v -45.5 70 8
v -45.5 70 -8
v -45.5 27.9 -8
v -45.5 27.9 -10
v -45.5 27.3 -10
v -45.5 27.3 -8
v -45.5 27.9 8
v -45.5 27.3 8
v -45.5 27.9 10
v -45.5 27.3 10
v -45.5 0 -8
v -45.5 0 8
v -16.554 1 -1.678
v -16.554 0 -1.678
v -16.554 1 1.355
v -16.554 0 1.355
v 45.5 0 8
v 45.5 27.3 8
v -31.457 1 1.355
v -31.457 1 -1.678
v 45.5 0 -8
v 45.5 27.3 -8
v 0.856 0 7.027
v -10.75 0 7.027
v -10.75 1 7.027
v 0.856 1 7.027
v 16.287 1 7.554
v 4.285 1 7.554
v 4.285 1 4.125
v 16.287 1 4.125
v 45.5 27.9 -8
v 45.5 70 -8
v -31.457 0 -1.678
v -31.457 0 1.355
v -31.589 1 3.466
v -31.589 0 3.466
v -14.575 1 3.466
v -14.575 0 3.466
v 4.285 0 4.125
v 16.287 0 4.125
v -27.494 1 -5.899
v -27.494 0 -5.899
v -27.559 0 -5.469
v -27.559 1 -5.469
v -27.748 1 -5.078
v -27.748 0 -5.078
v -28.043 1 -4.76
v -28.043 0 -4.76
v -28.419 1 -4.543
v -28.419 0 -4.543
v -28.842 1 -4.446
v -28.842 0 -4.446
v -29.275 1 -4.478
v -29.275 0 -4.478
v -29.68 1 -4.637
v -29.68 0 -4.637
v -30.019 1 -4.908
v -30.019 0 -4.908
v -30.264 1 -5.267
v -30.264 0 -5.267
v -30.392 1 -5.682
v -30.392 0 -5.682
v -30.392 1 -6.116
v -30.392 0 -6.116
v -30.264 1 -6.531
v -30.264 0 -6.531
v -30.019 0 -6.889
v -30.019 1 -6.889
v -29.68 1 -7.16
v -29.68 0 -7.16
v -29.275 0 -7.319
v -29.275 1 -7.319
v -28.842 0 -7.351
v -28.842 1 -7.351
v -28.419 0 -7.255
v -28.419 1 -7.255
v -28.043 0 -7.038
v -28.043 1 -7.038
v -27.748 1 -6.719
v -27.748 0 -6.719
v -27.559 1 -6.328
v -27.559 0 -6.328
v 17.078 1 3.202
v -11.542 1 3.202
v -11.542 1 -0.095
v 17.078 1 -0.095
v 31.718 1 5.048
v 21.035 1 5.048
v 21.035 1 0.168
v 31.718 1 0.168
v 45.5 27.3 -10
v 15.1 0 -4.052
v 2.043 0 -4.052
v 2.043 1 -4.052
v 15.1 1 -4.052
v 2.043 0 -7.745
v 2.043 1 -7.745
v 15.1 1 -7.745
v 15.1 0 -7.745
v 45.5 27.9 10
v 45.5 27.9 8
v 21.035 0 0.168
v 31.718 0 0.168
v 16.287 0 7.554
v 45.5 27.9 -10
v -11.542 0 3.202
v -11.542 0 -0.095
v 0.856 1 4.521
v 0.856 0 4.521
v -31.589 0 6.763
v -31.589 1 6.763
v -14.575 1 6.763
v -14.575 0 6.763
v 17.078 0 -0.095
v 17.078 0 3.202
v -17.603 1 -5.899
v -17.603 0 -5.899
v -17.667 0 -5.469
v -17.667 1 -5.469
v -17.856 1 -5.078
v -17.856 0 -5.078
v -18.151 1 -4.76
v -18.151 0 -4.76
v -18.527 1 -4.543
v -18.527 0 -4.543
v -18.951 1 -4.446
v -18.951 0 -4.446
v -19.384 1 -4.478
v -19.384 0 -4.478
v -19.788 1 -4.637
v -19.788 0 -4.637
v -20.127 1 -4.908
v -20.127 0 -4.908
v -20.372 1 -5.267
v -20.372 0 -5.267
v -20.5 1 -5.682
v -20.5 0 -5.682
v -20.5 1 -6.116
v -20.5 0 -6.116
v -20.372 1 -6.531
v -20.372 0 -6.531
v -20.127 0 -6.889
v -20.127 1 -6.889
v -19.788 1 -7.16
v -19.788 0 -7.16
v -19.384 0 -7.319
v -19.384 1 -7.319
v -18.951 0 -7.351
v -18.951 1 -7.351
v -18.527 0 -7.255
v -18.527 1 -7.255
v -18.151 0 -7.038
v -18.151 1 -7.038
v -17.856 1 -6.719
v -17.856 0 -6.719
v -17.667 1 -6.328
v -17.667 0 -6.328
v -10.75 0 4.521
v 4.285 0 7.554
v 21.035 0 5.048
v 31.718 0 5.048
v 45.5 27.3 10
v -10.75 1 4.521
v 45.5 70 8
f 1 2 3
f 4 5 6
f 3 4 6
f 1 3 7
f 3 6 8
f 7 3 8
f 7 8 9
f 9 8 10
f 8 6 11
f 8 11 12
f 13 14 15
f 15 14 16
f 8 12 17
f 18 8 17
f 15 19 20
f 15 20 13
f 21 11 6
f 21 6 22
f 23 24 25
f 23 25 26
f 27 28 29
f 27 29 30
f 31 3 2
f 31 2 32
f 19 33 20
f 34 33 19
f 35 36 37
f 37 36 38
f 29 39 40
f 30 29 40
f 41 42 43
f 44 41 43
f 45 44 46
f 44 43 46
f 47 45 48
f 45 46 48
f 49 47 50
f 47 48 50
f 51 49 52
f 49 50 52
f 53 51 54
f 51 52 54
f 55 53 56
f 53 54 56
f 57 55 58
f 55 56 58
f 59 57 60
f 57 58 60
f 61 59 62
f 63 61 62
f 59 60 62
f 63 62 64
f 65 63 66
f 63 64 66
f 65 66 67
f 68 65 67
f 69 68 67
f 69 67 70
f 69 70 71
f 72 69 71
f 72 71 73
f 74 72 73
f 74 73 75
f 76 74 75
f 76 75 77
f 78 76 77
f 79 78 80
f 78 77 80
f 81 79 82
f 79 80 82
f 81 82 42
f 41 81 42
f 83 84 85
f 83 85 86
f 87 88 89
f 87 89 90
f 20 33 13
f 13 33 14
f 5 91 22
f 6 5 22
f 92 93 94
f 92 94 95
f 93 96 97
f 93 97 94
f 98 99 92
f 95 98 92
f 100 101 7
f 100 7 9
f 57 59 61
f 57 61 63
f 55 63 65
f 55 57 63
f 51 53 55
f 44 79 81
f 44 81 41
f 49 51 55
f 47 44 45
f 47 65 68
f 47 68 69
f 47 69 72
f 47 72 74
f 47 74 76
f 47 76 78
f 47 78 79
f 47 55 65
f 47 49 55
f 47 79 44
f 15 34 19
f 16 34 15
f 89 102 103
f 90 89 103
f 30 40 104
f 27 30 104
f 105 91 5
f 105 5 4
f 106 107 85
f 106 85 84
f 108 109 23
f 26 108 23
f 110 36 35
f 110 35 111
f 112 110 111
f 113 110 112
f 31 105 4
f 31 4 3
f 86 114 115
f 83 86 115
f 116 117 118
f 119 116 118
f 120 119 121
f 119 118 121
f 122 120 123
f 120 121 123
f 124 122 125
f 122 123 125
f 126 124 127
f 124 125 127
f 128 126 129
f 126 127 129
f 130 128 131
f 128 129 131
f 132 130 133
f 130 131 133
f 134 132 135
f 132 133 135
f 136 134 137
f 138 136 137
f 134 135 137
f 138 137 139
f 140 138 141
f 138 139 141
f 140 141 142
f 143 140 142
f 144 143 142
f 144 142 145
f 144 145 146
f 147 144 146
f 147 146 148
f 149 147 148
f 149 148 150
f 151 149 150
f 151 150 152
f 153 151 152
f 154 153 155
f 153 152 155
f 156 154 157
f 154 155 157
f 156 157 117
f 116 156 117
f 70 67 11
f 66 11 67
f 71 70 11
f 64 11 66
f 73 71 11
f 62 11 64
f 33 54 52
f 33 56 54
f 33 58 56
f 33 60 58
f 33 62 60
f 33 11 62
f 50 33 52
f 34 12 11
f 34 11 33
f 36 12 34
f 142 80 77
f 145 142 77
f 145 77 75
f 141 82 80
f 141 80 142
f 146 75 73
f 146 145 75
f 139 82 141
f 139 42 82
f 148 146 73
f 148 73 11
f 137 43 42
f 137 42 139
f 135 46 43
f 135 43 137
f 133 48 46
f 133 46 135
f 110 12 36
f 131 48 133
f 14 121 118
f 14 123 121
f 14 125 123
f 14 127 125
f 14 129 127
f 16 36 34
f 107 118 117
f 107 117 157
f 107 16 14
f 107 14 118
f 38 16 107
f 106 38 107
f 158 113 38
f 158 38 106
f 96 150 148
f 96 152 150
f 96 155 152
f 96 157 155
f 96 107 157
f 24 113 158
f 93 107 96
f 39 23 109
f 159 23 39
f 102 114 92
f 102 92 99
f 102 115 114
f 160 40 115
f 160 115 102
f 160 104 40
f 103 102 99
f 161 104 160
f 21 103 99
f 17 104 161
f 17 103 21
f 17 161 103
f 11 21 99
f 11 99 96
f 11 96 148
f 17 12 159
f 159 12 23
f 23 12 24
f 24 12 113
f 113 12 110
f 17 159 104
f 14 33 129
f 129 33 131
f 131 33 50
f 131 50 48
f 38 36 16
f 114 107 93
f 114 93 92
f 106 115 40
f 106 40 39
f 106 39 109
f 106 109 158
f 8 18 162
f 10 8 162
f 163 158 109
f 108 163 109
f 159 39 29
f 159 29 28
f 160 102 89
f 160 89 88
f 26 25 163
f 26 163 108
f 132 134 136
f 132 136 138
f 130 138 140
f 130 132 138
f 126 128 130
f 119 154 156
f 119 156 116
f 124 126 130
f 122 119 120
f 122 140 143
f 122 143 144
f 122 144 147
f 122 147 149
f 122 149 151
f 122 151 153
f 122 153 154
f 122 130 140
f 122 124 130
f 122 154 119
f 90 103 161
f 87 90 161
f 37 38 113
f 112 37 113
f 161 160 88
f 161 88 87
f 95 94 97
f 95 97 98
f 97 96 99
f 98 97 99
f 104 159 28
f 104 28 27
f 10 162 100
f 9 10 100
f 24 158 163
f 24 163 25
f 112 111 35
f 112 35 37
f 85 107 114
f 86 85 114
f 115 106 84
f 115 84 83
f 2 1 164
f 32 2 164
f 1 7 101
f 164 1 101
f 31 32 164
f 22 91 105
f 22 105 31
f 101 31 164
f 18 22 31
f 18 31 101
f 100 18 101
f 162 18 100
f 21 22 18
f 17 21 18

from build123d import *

# Parameters (mm, degrees)
F0_W     = 91
F0_H     = 16
F1_DEPTH = 70
F2_R     = 1.456775
F2_W     = 10.683106
F2_H     = 4.879937
F2_W_2   = 13.057131
F2_H_2   = 3.692926
F2_W_3   = 17.013836
F2_H_3   = 3.297256
F2_W_4   = 14.903594
F2_H_4   = 3.033476
F2_W_5   = 11.60634
F2_H_5   = 2.505915
F2_W_6   = 12.00201
F2_H_6   = 3.429146
F2_W_7   = 28.620178
F2_H_7   = 3.297255
F3_DEPTH = 1
F4_W     = 0.6
F4_H     = 2
F5_DEPTH = 91


with BuildPart() as f1:
    # F0 (on Front) → F1 (new body)
    with BuildSketch(Plane.XZ):
        Rectangle(F0_W, F0_H)
    extrude(amount=-F1_DEPTH)

    # F2 (on face) → F3 (cut)
    with BuildSketch(Plane.XZ):
        with Locations((-28.951265, -5.898637)):
            Circle(F2_R)
        with Locations((-19.059498, -5.898637)):
            Circle(F2_R)
        with Locations((26.376682, 2.608282)):
            Rectangle(F2_W, F2_H)
        with Locations((8.571502, -5.898637)):
            Rectangle(F2_W_2, F2_H_2)
        with Locations((-23.08215, 5.114197)):
            Rectangle(F2_W_3, F2_H_3)
        with Locations((-24.005381, -0.161412)):
            Rectangle(F2_W_4, F2_H_4)
        with Locations((-4.947245, 5.773649)):
            Rectangle(F2_W_5, F2_H_5)
        with Locations((10.286076, 5.839593)):
            Rectangle(F2_W_6, F2_H_6)
        with Locations((2.768333, 1.55316)):
            Rectangle(F2_W_7, F2_H_7)
    extrude(amount=-F3_DEPTH, mode=Mode.SUBTRACT)

    # F4 (on face) → F5 (join, through all)
    with BuildSketch(Plane.YZ.offset(45.5)):
        with Locations((27.6, 9)):
            Rectangle(F4_W, F4_H)
        with Locations((27.6, -9)):
            Rectangle(F4_W, F4_H)
    extrude(amount=-F5_DEPTH)


solid = f1.part
